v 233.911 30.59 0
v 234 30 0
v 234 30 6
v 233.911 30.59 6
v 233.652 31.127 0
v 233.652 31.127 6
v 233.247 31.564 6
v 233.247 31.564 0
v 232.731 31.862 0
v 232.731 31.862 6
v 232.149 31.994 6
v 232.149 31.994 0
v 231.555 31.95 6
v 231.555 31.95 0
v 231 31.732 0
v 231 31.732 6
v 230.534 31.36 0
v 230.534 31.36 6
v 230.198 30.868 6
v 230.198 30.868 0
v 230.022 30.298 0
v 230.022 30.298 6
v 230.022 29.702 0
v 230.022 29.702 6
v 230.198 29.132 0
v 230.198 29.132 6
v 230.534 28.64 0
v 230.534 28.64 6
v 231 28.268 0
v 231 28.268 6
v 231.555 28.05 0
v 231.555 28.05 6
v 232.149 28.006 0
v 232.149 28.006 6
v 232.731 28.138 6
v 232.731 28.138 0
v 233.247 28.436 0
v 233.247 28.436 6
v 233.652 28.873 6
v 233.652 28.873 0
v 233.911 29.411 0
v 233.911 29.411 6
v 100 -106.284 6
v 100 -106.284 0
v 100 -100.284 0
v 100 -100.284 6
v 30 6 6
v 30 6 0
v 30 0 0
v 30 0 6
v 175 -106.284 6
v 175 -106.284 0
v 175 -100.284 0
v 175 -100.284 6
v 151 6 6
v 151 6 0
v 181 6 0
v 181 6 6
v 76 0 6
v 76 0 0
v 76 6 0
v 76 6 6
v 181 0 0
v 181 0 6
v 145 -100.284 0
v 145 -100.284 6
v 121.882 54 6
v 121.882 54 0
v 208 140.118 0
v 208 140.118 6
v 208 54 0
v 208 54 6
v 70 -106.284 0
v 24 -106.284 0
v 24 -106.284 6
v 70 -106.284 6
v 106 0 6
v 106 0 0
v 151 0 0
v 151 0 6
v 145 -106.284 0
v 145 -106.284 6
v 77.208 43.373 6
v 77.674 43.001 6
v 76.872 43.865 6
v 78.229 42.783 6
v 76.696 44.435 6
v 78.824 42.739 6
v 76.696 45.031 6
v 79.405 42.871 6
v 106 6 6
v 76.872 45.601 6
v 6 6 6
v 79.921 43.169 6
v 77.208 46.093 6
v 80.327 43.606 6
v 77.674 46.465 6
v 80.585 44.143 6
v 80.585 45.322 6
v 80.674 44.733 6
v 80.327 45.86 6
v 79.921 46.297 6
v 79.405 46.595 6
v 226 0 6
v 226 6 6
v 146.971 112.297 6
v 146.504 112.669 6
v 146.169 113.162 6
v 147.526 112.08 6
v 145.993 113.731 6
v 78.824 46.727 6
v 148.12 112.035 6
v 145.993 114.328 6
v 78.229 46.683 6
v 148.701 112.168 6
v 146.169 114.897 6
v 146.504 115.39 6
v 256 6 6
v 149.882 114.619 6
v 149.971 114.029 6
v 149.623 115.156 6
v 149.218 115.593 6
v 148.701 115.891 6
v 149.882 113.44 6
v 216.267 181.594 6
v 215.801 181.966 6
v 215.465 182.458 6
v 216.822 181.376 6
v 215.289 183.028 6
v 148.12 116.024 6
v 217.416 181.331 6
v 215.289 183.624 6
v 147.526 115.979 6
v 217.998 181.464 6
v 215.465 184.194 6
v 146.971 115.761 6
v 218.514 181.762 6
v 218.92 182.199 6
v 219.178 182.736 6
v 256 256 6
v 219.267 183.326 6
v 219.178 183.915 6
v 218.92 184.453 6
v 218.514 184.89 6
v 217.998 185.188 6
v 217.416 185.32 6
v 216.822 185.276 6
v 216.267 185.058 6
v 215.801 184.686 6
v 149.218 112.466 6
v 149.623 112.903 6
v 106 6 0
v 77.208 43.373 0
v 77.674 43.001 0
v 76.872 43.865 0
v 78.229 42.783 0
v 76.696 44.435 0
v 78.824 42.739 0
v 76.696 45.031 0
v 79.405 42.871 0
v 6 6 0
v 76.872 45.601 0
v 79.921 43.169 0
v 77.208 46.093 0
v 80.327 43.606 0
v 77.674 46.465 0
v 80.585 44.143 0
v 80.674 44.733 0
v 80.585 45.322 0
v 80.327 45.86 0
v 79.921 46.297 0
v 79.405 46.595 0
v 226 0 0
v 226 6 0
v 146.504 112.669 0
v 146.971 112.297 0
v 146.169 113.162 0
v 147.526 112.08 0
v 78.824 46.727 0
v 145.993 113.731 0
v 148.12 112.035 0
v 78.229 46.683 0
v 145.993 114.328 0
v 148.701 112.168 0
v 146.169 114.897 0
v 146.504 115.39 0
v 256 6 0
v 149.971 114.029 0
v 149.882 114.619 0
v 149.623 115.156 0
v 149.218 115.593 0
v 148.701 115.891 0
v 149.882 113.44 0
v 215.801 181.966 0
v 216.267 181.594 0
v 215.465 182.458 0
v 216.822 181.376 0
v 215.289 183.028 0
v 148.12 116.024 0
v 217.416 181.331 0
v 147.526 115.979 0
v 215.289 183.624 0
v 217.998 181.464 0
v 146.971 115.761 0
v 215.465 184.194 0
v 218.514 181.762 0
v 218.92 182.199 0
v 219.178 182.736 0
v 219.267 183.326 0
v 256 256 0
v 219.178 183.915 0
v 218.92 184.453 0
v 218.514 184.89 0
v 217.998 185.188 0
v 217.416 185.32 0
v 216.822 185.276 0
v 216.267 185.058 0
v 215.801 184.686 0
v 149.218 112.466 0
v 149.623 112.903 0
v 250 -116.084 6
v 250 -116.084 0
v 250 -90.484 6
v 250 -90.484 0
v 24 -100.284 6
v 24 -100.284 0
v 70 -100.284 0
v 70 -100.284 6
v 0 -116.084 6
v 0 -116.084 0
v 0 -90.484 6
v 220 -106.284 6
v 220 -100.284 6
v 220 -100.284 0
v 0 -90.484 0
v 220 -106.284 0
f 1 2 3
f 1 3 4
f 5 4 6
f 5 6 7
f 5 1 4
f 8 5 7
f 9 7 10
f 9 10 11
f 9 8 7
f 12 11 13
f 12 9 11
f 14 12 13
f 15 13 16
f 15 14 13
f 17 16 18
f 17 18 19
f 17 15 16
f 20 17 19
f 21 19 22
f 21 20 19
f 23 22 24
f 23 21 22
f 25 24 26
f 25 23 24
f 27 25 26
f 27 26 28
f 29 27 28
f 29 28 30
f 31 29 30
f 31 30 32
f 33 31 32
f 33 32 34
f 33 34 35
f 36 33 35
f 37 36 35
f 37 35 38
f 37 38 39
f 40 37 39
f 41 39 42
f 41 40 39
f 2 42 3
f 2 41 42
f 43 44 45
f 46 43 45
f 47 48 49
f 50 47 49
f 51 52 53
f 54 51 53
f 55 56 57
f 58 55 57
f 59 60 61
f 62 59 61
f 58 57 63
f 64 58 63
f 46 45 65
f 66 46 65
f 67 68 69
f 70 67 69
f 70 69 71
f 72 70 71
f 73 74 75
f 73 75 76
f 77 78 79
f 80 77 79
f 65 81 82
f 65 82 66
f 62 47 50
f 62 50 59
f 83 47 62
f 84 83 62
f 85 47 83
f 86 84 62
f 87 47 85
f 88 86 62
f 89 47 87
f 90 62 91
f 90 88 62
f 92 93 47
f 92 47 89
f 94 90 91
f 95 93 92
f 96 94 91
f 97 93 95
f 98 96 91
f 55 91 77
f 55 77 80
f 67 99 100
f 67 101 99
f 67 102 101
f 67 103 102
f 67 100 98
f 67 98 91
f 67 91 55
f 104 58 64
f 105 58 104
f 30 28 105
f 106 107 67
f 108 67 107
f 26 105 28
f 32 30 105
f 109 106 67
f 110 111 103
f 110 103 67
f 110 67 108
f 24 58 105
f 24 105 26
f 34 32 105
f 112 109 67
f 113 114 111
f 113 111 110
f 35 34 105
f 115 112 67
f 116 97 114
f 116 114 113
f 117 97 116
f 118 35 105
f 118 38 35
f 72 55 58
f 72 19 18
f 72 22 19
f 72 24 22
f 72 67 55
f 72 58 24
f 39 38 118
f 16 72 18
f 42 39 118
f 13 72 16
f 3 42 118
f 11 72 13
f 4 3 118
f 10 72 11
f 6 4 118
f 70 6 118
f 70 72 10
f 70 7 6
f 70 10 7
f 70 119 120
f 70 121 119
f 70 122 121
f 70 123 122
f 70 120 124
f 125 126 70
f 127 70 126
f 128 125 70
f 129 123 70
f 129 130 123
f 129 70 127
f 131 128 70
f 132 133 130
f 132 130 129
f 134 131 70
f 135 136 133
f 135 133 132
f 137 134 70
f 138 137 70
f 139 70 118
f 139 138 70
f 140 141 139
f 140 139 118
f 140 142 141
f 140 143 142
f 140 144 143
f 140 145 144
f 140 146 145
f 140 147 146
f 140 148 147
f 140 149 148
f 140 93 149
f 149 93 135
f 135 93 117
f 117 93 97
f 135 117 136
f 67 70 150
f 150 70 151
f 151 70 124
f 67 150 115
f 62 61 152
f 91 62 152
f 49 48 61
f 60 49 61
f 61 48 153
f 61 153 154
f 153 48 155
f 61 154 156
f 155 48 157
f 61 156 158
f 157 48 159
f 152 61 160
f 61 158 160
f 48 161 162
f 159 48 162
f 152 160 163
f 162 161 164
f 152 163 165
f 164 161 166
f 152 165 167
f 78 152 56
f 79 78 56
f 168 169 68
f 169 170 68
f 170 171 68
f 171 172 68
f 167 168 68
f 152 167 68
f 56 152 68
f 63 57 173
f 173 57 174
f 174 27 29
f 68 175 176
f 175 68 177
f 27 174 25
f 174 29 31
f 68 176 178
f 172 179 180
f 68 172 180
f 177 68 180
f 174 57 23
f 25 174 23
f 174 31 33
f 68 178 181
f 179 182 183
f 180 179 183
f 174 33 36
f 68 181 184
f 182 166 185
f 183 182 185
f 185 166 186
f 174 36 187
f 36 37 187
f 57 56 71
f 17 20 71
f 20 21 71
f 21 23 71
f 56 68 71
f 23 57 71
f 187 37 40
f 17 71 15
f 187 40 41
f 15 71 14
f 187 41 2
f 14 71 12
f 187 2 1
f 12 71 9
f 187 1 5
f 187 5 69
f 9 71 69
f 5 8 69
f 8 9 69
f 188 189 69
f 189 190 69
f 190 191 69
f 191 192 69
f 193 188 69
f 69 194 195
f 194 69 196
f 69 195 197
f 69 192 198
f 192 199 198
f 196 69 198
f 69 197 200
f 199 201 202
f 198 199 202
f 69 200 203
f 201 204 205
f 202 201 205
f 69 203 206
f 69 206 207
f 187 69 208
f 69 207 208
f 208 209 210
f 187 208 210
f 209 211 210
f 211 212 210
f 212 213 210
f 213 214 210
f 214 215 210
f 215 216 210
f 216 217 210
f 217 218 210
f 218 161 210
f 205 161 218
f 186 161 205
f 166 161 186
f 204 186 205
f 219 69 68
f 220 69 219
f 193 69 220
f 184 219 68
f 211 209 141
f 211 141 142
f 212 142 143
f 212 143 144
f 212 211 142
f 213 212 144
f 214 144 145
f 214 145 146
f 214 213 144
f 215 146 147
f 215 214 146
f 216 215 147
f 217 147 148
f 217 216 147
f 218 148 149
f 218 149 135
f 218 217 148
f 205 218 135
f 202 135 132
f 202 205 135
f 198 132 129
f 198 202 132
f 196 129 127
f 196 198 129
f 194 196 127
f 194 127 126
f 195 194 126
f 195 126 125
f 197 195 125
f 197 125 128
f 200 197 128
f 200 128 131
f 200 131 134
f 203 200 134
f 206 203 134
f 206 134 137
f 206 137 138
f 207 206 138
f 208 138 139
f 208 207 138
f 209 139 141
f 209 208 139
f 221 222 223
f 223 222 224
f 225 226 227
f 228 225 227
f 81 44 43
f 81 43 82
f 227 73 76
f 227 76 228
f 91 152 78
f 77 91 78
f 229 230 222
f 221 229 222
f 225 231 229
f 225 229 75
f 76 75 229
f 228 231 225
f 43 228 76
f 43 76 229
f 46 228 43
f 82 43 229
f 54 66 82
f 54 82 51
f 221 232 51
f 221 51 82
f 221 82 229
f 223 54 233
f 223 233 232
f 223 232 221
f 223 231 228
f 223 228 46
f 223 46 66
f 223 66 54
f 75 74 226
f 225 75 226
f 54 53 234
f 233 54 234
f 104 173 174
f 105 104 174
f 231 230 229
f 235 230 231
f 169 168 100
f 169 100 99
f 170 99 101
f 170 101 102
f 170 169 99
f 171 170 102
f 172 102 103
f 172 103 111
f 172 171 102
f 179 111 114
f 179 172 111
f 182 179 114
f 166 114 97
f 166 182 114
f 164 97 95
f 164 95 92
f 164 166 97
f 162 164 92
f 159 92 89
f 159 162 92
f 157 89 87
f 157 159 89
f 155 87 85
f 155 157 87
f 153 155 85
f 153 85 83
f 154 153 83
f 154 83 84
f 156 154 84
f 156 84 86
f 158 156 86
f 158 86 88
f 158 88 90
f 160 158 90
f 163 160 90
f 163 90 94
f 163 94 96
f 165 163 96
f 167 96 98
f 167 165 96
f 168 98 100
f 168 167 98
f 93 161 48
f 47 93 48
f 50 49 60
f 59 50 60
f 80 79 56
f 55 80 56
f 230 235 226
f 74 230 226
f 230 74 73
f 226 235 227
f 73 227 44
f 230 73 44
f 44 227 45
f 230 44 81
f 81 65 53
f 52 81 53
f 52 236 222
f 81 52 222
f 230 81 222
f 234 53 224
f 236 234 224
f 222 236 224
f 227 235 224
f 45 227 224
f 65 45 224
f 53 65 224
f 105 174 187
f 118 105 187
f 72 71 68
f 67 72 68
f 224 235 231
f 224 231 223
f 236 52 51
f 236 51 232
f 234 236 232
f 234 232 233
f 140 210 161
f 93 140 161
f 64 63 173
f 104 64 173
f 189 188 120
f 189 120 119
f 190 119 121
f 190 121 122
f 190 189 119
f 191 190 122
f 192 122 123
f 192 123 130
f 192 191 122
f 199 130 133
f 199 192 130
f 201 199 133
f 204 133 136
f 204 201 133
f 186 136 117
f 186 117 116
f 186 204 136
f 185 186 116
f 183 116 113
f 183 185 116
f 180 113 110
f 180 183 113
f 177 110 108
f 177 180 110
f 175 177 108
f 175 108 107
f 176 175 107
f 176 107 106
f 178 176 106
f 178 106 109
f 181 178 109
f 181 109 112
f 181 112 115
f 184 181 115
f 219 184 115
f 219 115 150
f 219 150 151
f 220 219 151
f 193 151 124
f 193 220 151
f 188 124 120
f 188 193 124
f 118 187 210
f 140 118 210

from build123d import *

# Parameters (mm, degrees)
F0_R     = 2
F1_DEPTH = 6
F0_W     = 250
F0_H     = 25.6
F0_W_2   = 46
F0_H_2   = 6
F0_W_3   = 45
F2_DEPTH = 6


with BuildPart() as f1:
    # F0 (on Top) → F1 (new body)
    with BuildSketch(Plane.XY):
        Polygon((30, 6), (30, 0), (76, 0), (76, 6), (106, 6), (106, 0), (151, 0), (151, 6), (181, 6), (181, 0), (226, 0), (226, 6), (256, 6), (256, 256), (6, 6), align=None)
        with Locations((78.674098, 44.732973)):
            Circle(F0_R, mode=Mode.SUBTRACT)
        with Locations((231.999911, 30.000089)):
            Circle(F0_R, mode=Mode.SUBTRACT)
        with Locations((147.970563, 114.029437)):
            Circle(F0_R, mode=Mode.SUBTRACT)
        Polygon((121.882251, 54), (208, 140.117749), (208, 54), align=None, mode=Mode.SUBTRACT)
        with Locations((217.267027, 183.325902)):
            Circle(F0_R, mode=Mode.SUBTRACT)
    extrude(amount=F1_DEPTH)


with BuildPart() as f2:
    # F0 (on Top) → F2 (new body)
    with BuildSketch(Plane.XY):
        with Locations((125, -103.284263)):
            Rectangle(F0_W, F0_H)
        with Locations((47, -103.284263)):
            Rectangle(F0_W_2, F0_H_2, mode=Mode.SUBTRACT)
        with Locations((122.5, -103.284263)):
            Rectangle(F0_W_3, F0_H_2, mode=Mode.SUBTRACT)
        with Locations((197.5, -103.284263)):
            Rectangle(F0_W_3, F0_H_2, mode=Mode.SUBTRACT)
    extrude(amount=F2_DEPTH)


solid = Compound([f1.part, f2.part])
